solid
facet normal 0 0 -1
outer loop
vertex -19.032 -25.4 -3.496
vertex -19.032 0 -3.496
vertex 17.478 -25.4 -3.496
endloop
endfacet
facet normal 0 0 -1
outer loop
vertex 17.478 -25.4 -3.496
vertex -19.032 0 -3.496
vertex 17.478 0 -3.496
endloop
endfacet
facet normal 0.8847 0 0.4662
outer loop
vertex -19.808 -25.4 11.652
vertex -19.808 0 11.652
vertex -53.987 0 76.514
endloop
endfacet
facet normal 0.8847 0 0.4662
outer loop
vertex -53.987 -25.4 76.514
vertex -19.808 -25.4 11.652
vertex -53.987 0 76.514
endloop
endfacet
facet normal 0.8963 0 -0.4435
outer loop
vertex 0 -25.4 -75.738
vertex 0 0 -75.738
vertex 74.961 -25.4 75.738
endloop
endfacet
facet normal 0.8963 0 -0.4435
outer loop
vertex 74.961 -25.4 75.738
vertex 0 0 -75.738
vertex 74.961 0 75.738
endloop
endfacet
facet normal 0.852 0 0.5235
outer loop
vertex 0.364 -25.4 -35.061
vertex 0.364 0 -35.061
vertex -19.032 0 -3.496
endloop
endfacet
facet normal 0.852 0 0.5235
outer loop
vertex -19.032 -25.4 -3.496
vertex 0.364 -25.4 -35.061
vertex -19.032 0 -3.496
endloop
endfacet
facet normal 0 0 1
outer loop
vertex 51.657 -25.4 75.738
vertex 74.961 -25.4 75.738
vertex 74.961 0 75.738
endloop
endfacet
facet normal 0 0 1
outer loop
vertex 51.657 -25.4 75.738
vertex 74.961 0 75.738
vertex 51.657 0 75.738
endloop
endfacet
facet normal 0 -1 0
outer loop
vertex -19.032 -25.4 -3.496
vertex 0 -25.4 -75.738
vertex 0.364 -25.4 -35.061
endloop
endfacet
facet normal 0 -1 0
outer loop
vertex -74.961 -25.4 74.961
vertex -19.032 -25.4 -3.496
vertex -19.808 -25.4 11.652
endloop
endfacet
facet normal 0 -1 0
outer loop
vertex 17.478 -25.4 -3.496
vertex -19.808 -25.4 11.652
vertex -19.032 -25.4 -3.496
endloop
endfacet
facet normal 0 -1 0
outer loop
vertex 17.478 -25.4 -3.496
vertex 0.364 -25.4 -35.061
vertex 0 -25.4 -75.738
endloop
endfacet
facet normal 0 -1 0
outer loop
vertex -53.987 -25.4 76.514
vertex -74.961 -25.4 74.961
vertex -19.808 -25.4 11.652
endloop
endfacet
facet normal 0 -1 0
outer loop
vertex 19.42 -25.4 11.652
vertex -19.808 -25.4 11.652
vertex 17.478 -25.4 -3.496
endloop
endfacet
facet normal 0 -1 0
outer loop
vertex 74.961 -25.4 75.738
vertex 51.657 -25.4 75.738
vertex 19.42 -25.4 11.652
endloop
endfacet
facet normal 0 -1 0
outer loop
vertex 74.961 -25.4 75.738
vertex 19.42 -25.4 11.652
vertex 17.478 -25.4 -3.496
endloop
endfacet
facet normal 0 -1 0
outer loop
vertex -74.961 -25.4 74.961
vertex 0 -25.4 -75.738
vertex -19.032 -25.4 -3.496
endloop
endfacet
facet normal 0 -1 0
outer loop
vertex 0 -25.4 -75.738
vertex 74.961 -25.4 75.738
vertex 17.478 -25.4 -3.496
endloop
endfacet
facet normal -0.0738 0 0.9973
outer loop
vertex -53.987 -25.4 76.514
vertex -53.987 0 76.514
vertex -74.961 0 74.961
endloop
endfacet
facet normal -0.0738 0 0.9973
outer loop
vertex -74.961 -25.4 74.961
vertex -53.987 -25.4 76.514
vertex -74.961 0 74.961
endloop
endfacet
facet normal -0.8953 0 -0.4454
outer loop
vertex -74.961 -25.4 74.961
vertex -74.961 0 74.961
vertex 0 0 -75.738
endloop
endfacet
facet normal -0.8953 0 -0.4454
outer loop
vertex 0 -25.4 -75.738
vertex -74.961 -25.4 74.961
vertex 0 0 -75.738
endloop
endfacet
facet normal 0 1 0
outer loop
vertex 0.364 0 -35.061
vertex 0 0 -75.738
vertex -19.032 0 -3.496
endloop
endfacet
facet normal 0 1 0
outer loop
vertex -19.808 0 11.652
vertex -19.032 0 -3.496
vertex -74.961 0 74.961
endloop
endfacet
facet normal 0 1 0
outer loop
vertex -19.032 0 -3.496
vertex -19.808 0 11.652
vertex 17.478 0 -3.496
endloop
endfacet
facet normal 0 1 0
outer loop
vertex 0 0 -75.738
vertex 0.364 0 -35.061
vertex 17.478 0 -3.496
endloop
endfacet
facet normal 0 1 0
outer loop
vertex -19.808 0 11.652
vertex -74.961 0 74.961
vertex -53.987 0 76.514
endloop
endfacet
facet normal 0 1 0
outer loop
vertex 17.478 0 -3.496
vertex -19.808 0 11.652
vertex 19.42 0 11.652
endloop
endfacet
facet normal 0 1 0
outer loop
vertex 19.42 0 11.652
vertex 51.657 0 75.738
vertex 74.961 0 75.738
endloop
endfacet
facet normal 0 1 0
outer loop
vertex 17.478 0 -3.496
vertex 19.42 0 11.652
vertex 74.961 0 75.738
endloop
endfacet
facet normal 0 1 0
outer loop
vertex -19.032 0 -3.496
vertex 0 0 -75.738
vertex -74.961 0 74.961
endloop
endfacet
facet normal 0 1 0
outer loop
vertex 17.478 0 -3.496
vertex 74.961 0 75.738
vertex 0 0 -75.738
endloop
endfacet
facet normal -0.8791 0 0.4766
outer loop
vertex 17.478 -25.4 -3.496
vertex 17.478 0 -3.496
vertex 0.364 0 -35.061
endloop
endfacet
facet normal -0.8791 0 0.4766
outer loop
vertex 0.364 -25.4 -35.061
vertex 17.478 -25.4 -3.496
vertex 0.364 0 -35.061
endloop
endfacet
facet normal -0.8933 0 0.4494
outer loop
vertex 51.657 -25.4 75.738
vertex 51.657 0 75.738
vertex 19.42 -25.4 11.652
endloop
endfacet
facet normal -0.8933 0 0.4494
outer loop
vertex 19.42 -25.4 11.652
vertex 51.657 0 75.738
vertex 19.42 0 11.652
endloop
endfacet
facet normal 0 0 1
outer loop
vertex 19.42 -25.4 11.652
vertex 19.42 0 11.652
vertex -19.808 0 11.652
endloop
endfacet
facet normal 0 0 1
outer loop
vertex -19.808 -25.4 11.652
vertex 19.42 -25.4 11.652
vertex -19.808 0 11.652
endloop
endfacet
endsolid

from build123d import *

# Parameters (mm, degrees)
F1_DEPTH = 25.4


with BuildPart() as f1:
    # F0 (on Front) → F1 (new body)
    with BuildSketch(Plane.XZ):
        Polygon((-53.987332, 76.514423), (-74.960828, 74.960828), (0, -75.737618), (74.960828, 75.737618), (51.656947, 75.737618), (19.419903, 11.651943), (-19.808304, 11.651943), align=None)
        Polygon((0.364124, -35.061012), (-19.031508, -3.495583), (17.477909, -3.495583), align=None, mode=Mode.SUBTRACT)
    extrude(amount=F1_DEPTH)


solid = f1.part
